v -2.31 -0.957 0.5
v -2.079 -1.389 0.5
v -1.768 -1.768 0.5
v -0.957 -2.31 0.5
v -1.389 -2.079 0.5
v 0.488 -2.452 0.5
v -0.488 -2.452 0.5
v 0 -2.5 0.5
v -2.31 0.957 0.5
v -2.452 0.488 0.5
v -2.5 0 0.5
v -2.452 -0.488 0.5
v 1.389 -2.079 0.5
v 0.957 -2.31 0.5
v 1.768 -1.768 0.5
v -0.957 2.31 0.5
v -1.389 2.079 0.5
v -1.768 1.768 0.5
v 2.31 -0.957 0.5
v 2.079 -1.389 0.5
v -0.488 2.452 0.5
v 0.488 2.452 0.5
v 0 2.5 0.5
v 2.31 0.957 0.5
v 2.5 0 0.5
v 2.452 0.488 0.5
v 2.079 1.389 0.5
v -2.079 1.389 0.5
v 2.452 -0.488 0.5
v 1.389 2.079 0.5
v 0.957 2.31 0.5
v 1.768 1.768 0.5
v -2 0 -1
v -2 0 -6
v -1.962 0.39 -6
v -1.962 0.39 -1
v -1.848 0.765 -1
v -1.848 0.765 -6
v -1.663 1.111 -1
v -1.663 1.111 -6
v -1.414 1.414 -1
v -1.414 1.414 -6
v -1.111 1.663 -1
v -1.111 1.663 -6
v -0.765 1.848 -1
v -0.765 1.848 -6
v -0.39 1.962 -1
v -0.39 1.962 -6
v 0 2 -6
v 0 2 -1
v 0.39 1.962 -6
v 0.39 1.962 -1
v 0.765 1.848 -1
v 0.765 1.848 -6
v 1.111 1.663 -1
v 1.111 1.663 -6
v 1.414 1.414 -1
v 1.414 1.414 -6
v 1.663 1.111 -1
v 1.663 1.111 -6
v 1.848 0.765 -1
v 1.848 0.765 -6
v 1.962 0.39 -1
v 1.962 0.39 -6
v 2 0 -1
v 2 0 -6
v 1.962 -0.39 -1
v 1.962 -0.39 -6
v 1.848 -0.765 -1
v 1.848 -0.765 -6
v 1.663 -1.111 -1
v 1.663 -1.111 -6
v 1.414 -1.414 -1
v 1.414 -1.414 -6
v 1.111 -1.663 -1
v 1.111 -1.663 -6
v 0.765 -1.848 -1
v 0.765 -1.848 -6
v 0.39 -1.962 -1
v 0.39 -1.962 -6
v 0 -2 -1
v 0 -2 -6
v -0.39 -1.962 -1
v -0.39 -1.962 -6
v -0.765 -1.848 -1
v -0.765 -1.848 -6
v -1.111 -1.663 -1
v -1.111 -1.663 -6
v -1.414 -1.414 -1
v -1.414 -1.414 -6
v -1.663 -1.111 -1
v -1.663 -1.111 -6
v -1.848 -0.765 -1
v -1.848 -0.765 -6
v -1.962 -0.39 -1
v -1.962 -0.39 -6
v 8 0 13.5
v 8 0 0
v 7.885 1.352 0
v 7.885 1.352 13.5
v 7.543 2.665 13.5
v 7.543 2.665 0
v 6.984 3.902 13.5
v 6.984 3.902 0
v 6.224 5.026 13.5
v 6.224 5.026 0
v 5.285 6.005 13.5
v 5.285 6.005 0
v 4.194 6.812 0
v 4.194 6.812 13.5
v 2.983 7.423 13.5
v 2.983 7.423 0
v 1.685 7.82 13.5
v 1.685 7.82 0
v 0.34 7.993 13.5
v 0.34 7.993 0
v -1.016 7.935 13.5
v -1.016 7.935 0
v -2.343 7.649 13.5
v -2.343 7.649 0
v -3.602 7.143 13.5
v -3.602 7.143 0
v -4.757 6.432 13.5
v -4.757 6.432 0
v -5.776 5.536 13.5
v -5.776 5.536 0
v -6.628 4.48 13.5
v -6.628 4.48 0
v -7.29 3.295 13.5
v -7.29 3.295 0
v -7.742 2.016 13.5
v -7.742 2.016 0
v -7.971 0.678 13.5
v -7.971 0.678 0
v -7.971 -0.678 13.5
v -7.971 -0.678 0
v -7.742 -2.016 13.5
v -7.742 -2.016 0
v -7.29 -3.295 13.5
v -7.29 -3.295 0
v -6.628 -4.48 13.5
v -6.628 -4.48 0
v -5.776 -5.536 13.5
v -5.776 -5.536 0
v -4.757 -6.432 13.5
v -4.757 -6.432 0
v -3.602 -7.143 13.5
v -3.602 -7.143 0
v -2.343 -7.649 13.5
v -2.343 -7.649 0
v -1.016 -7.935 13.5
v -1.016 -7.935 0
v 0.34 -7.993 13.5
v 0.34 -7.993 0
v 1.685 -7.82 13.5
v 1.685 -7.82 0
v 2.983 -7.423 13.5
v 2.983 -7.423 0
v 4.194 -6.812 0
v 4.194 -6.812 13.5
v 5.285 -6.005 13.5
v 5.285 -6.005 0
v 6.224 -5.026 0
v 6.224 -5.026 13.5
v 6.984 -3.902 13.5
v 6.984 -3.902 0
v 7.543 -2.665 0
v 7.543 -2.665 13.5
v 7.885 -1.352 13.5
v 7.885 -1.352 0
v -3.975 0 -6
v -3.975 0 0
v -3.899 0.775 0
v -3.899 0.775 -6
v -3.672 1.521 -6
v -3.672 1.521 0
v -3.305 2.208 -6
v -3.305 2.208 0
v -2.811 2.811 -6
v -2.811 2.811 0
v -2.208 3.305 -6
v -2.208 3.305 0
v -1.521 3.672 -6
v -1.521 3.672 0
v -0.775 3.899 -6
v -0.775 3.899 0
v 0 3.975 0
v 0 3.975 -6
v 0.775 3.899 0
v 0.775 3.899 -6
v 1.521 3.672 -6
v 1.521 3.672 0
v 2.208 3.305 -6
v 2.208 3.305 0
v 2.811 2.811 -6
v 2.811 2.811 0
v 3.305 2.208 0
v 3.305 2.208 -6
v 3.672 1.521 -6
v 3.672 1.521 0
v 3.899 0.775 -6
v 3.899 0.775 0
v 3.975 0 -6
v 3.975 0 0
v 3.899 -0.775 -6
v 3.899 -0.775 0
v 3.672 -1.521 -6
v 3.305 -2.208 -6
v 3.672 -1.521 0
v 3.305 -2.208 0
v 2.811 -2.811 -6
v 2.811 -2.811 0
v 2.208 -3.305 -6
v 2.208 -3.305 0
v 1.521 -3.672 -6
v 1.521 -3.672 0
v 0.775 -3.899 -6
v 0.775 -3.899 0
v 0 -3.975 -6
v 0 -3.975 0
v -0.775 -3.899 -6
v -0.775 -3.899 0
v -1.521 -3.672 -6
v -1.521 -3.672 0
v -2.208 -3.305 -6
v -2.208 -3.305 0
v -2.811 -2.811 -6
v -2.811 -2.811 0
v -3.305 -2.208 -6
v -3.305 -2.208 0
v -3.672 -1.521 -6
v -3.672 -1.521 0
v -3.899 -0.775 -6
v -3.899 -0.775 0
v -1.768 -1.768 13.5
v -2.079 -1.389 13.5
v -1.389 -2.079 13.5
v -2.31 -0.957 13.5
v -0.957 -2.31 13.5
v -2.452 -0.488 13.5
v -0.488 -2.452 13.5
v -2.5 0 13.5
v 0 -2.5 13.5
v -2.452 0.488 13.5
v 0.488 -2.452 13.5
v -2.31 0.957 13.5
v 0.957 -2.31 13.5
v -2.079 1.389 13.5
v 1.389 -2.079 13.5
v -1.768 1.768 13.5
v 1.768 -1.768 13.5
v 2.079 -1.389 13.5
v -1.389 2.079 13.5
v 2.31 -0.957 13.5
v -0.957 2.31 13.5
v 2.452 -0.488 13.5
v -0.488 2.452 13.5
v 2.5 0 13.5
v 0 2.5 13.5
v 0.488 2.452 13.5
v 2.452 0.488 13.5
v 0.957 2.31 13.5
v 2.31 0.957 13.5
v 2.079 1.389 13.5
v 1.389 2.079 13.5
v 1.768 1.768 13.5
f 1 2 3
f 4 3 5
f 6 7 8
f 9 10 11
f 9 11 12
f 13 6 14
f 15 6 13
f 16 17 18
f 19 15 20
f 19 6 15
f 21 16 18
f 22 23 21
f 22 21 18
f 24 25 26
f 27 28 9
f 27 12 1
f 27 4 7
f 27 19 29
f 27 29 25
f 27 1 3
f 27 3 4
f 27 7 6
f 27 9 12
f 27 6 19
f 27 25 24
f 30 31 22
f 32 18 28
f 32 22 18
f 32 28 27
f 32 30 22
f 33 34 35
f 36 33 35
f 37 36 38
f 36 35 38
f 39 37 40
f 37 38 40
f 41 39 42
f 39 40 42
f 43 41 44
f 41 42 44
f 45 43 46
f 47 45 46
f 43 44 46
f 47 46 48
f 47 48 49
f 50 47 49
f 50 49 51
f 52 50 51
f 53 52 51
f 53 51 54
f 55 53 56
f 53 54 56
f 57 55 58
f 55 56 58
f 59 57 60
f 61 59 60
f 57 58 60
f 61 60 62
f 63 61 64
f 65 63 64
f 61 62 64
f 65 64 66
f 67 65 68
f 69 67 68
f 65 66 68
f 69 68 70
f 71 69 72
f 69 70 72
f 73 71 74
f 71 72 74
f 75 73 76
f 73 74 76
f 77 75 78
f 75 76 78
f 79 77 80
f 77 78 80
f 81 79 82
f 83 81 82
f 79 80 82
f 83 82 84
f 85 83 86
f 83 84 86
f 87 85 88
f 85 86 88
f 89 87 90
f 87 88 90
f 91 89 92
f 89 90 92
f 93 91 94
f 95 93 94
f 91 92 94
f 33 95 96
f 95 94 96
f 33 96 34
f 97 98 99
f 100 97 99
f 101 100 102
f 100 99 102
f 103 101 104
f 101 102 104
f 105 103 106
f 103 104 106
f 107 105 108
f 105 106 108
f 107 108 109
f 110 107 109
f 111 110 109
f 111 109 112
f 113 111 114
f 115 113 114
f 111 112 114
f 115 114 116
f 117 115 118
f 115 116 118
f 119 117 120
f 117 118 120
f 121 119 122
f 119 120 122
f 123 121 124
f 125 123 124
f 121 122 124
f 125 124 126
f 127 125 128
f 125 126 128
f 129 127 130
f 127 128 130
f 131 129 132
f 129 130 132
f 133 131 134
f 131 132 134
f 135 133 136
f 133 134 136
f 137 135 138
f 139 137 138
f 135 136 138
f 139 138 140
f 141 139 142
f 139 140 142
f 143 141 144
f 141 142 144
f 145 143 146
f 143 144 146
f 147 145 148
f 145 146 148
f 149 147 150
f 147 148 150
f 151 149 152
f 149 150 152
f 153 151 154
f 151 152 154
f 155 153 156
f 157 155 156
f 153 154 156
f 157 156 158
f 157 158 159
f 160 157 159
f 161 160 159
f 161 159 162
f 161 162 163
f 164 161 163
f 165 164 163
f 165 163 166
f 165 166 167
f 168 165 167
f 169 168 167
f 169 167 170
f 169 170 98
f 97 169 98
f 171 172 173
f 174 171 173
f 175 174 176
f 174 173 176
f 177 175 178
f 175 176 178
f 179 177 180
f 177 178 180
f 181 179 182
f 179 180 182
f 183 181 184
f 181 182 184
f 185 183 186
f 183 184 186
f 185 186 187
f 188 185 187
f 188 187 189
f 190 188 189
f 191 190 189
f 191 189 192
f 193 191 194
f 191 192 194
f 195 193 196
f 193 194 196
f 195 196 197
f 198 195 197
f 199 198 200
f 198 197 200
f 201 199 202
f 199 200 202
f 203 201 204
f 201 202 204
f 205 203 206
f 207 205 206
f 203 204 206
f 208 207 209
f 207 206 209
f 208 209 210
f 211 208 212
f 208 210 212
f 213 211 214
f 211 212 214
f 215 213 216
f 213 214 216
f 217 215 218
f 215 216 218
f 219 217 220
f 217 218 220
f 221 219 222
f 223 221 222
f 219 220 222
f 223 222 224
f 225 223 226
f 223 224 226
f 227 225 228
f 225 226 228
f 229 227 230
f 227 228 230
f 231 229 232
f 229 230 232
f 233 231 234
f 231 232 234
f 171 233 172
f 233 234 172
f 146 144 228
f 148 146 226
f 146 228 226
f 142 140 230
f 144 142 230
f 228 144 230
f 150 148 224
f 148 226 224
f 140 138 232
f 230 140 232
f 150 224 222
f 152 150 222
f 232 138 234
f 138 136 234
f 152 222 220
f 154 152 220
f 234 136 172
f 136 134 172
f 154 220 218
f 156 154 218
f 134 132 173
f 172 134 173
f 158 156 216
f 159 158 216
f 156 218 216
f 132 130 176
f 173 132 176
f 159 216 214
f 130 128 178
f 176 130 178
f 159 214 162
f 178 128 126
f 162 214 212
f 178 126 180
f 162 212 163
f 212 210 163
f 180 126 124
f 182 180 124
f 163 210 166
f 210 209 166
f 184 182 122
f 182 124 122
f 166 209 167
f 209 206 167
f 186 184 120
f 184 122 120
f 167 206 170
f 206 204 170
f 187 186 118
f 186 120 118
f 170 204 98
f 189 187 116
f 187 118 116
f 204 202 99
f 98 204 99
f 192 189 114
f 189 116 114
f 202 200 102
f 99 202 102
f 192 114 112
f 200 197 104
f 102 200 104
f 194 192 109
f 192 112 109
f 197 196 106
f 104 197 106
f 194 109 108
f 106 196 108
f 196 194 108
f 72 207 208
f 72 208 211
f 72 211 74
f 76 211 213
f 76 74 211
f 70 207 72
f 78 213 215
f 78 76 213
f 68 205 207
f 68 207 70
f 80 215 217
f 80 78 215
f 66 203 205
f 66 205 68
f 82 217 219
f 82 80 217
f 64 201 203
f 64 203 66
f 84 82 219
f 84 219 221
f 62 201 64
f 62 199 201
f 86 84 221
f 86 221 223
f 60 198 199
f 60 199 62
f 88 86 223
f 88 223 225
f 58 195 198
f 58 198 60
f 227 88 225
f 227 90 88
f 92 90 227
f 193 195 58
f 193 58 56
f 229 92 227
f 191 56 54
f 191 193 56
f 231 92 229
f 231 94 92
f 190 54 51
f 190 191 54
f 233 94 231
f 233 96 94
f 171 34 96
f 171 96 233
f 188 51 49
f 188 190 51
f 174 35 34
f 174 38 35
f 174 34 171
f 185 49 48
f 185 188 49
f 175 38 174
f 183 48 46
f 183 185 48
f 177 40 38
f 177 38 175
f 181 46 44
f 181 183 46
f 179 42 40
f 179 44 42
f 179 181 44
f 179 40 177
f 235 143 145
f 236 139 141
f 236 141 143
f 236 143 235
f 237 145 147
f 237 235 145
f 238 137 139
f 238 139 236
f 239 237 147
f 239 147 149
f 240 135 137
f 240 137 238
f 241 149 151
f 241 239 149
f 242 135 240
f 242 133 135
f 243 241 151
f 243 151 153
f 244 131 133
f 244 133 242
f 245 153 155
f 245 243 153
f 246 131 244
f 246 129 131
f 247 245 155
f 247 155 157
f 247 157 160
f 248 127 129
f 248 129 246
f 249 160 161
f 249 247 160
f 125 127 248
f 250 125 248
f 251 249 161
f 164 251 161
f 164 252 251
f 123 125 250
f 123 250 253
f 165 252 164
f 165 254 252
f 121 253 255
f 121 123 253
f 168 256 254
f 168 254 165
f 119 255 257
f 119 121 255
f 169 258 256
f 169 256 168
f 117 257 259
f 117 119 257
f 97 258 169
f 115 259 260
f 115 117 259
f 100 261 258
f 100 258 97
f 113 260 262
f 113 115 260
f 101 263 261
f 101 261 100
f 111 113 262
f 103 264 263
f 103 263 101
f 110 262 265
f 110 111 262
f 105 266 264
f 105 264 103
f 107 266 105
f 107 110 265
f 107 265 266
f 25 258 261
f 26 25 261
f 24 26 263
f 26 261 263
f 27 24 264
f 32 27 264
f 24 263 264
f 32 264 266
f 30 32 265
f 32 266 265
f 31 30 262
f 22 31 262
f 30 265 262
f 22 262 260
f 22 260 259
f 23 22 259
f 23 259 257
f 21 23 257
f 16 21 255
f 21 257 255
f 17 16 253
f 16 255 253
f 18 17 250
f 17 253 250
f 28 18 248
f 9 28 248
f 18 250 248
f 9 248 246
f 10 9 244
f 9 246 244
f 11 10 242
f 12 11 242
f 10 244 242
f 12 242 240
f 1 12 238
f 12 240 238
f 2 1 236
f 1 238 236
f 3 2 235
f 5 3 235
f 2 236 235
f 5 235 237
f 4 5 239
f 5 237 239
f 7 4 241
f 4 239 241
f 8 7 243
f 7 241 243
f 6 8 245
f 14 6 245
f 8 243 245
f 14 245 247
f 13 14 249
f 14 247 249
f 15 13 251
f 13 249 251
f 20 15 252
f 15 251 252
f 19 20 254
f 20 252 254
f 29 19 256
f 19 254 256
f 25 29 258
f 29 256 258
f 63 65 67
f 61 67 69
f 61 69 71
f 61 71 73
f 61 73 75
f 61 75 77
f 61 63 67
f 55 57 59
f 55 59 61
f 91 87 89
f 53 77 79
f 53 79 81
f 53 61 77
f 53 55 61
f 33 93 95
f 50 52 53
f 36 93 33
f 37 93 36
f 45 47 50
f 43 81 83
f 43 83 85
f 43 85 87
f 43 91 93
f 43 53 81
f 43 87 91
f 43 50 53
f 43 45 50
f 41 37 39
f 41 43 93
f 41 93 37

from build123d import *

# Parameters (mm, degrees)
SKETCH1_R           = 8
BOSS_EXTRUDE1_DEPTH = 13.5
SKETCH3_R           = 3.975
BOSS_EXTRUDE2_DEPTH = 6
SKETCH4_R           = 2.5
CUT_EXTRUDE2_DEPTH  = 13
SKETCH7_R           = 2
CUT_EXTRUDE3_DEPTH  = 5


with BuildPart() as part:
    # Sketch1 → Boss-Extrude1 (new body)
    with BuildSketch(Plane.XY):
        Circle(SKETCH1_R)
    extrude(amount=BOSS_EXTRUDE1_DEPTH)

    # Sketch3 → Boss-Extrude2 (add)
    with BuildSketch(Plane(origin=(0, 0, 0), x_dir=(-1, 0, 0), z_dir=(0, 0, -1))):
        Circle(SKETCH3_R)
    extrude(amount=BOSS_EXTRUDE2_DEPTH)

    # Sketch4 → Cut-Extrude2 (cut)
    with BuildSketch(Plane.XY.offset(13.5)):
        Circle(SKETCH4_R)
    extrude(amount=-CUT_EXTRUDE2_DEPTH, mode=Mode.SUBTRACT)

    # Sketch7 → Cut-Extrude3 (cut)
    with BuildSketch(Plane(origin=(0, 0, -6), x_dir=(-1, 0, 0), z_dir=(0, 0, -1))):
        Circle(SKETCH7_R)
    extrude(amount=-CUT_EXTRUDE3_DEPTH, mode=Mode.SUBTRACT)


solid = part.part
